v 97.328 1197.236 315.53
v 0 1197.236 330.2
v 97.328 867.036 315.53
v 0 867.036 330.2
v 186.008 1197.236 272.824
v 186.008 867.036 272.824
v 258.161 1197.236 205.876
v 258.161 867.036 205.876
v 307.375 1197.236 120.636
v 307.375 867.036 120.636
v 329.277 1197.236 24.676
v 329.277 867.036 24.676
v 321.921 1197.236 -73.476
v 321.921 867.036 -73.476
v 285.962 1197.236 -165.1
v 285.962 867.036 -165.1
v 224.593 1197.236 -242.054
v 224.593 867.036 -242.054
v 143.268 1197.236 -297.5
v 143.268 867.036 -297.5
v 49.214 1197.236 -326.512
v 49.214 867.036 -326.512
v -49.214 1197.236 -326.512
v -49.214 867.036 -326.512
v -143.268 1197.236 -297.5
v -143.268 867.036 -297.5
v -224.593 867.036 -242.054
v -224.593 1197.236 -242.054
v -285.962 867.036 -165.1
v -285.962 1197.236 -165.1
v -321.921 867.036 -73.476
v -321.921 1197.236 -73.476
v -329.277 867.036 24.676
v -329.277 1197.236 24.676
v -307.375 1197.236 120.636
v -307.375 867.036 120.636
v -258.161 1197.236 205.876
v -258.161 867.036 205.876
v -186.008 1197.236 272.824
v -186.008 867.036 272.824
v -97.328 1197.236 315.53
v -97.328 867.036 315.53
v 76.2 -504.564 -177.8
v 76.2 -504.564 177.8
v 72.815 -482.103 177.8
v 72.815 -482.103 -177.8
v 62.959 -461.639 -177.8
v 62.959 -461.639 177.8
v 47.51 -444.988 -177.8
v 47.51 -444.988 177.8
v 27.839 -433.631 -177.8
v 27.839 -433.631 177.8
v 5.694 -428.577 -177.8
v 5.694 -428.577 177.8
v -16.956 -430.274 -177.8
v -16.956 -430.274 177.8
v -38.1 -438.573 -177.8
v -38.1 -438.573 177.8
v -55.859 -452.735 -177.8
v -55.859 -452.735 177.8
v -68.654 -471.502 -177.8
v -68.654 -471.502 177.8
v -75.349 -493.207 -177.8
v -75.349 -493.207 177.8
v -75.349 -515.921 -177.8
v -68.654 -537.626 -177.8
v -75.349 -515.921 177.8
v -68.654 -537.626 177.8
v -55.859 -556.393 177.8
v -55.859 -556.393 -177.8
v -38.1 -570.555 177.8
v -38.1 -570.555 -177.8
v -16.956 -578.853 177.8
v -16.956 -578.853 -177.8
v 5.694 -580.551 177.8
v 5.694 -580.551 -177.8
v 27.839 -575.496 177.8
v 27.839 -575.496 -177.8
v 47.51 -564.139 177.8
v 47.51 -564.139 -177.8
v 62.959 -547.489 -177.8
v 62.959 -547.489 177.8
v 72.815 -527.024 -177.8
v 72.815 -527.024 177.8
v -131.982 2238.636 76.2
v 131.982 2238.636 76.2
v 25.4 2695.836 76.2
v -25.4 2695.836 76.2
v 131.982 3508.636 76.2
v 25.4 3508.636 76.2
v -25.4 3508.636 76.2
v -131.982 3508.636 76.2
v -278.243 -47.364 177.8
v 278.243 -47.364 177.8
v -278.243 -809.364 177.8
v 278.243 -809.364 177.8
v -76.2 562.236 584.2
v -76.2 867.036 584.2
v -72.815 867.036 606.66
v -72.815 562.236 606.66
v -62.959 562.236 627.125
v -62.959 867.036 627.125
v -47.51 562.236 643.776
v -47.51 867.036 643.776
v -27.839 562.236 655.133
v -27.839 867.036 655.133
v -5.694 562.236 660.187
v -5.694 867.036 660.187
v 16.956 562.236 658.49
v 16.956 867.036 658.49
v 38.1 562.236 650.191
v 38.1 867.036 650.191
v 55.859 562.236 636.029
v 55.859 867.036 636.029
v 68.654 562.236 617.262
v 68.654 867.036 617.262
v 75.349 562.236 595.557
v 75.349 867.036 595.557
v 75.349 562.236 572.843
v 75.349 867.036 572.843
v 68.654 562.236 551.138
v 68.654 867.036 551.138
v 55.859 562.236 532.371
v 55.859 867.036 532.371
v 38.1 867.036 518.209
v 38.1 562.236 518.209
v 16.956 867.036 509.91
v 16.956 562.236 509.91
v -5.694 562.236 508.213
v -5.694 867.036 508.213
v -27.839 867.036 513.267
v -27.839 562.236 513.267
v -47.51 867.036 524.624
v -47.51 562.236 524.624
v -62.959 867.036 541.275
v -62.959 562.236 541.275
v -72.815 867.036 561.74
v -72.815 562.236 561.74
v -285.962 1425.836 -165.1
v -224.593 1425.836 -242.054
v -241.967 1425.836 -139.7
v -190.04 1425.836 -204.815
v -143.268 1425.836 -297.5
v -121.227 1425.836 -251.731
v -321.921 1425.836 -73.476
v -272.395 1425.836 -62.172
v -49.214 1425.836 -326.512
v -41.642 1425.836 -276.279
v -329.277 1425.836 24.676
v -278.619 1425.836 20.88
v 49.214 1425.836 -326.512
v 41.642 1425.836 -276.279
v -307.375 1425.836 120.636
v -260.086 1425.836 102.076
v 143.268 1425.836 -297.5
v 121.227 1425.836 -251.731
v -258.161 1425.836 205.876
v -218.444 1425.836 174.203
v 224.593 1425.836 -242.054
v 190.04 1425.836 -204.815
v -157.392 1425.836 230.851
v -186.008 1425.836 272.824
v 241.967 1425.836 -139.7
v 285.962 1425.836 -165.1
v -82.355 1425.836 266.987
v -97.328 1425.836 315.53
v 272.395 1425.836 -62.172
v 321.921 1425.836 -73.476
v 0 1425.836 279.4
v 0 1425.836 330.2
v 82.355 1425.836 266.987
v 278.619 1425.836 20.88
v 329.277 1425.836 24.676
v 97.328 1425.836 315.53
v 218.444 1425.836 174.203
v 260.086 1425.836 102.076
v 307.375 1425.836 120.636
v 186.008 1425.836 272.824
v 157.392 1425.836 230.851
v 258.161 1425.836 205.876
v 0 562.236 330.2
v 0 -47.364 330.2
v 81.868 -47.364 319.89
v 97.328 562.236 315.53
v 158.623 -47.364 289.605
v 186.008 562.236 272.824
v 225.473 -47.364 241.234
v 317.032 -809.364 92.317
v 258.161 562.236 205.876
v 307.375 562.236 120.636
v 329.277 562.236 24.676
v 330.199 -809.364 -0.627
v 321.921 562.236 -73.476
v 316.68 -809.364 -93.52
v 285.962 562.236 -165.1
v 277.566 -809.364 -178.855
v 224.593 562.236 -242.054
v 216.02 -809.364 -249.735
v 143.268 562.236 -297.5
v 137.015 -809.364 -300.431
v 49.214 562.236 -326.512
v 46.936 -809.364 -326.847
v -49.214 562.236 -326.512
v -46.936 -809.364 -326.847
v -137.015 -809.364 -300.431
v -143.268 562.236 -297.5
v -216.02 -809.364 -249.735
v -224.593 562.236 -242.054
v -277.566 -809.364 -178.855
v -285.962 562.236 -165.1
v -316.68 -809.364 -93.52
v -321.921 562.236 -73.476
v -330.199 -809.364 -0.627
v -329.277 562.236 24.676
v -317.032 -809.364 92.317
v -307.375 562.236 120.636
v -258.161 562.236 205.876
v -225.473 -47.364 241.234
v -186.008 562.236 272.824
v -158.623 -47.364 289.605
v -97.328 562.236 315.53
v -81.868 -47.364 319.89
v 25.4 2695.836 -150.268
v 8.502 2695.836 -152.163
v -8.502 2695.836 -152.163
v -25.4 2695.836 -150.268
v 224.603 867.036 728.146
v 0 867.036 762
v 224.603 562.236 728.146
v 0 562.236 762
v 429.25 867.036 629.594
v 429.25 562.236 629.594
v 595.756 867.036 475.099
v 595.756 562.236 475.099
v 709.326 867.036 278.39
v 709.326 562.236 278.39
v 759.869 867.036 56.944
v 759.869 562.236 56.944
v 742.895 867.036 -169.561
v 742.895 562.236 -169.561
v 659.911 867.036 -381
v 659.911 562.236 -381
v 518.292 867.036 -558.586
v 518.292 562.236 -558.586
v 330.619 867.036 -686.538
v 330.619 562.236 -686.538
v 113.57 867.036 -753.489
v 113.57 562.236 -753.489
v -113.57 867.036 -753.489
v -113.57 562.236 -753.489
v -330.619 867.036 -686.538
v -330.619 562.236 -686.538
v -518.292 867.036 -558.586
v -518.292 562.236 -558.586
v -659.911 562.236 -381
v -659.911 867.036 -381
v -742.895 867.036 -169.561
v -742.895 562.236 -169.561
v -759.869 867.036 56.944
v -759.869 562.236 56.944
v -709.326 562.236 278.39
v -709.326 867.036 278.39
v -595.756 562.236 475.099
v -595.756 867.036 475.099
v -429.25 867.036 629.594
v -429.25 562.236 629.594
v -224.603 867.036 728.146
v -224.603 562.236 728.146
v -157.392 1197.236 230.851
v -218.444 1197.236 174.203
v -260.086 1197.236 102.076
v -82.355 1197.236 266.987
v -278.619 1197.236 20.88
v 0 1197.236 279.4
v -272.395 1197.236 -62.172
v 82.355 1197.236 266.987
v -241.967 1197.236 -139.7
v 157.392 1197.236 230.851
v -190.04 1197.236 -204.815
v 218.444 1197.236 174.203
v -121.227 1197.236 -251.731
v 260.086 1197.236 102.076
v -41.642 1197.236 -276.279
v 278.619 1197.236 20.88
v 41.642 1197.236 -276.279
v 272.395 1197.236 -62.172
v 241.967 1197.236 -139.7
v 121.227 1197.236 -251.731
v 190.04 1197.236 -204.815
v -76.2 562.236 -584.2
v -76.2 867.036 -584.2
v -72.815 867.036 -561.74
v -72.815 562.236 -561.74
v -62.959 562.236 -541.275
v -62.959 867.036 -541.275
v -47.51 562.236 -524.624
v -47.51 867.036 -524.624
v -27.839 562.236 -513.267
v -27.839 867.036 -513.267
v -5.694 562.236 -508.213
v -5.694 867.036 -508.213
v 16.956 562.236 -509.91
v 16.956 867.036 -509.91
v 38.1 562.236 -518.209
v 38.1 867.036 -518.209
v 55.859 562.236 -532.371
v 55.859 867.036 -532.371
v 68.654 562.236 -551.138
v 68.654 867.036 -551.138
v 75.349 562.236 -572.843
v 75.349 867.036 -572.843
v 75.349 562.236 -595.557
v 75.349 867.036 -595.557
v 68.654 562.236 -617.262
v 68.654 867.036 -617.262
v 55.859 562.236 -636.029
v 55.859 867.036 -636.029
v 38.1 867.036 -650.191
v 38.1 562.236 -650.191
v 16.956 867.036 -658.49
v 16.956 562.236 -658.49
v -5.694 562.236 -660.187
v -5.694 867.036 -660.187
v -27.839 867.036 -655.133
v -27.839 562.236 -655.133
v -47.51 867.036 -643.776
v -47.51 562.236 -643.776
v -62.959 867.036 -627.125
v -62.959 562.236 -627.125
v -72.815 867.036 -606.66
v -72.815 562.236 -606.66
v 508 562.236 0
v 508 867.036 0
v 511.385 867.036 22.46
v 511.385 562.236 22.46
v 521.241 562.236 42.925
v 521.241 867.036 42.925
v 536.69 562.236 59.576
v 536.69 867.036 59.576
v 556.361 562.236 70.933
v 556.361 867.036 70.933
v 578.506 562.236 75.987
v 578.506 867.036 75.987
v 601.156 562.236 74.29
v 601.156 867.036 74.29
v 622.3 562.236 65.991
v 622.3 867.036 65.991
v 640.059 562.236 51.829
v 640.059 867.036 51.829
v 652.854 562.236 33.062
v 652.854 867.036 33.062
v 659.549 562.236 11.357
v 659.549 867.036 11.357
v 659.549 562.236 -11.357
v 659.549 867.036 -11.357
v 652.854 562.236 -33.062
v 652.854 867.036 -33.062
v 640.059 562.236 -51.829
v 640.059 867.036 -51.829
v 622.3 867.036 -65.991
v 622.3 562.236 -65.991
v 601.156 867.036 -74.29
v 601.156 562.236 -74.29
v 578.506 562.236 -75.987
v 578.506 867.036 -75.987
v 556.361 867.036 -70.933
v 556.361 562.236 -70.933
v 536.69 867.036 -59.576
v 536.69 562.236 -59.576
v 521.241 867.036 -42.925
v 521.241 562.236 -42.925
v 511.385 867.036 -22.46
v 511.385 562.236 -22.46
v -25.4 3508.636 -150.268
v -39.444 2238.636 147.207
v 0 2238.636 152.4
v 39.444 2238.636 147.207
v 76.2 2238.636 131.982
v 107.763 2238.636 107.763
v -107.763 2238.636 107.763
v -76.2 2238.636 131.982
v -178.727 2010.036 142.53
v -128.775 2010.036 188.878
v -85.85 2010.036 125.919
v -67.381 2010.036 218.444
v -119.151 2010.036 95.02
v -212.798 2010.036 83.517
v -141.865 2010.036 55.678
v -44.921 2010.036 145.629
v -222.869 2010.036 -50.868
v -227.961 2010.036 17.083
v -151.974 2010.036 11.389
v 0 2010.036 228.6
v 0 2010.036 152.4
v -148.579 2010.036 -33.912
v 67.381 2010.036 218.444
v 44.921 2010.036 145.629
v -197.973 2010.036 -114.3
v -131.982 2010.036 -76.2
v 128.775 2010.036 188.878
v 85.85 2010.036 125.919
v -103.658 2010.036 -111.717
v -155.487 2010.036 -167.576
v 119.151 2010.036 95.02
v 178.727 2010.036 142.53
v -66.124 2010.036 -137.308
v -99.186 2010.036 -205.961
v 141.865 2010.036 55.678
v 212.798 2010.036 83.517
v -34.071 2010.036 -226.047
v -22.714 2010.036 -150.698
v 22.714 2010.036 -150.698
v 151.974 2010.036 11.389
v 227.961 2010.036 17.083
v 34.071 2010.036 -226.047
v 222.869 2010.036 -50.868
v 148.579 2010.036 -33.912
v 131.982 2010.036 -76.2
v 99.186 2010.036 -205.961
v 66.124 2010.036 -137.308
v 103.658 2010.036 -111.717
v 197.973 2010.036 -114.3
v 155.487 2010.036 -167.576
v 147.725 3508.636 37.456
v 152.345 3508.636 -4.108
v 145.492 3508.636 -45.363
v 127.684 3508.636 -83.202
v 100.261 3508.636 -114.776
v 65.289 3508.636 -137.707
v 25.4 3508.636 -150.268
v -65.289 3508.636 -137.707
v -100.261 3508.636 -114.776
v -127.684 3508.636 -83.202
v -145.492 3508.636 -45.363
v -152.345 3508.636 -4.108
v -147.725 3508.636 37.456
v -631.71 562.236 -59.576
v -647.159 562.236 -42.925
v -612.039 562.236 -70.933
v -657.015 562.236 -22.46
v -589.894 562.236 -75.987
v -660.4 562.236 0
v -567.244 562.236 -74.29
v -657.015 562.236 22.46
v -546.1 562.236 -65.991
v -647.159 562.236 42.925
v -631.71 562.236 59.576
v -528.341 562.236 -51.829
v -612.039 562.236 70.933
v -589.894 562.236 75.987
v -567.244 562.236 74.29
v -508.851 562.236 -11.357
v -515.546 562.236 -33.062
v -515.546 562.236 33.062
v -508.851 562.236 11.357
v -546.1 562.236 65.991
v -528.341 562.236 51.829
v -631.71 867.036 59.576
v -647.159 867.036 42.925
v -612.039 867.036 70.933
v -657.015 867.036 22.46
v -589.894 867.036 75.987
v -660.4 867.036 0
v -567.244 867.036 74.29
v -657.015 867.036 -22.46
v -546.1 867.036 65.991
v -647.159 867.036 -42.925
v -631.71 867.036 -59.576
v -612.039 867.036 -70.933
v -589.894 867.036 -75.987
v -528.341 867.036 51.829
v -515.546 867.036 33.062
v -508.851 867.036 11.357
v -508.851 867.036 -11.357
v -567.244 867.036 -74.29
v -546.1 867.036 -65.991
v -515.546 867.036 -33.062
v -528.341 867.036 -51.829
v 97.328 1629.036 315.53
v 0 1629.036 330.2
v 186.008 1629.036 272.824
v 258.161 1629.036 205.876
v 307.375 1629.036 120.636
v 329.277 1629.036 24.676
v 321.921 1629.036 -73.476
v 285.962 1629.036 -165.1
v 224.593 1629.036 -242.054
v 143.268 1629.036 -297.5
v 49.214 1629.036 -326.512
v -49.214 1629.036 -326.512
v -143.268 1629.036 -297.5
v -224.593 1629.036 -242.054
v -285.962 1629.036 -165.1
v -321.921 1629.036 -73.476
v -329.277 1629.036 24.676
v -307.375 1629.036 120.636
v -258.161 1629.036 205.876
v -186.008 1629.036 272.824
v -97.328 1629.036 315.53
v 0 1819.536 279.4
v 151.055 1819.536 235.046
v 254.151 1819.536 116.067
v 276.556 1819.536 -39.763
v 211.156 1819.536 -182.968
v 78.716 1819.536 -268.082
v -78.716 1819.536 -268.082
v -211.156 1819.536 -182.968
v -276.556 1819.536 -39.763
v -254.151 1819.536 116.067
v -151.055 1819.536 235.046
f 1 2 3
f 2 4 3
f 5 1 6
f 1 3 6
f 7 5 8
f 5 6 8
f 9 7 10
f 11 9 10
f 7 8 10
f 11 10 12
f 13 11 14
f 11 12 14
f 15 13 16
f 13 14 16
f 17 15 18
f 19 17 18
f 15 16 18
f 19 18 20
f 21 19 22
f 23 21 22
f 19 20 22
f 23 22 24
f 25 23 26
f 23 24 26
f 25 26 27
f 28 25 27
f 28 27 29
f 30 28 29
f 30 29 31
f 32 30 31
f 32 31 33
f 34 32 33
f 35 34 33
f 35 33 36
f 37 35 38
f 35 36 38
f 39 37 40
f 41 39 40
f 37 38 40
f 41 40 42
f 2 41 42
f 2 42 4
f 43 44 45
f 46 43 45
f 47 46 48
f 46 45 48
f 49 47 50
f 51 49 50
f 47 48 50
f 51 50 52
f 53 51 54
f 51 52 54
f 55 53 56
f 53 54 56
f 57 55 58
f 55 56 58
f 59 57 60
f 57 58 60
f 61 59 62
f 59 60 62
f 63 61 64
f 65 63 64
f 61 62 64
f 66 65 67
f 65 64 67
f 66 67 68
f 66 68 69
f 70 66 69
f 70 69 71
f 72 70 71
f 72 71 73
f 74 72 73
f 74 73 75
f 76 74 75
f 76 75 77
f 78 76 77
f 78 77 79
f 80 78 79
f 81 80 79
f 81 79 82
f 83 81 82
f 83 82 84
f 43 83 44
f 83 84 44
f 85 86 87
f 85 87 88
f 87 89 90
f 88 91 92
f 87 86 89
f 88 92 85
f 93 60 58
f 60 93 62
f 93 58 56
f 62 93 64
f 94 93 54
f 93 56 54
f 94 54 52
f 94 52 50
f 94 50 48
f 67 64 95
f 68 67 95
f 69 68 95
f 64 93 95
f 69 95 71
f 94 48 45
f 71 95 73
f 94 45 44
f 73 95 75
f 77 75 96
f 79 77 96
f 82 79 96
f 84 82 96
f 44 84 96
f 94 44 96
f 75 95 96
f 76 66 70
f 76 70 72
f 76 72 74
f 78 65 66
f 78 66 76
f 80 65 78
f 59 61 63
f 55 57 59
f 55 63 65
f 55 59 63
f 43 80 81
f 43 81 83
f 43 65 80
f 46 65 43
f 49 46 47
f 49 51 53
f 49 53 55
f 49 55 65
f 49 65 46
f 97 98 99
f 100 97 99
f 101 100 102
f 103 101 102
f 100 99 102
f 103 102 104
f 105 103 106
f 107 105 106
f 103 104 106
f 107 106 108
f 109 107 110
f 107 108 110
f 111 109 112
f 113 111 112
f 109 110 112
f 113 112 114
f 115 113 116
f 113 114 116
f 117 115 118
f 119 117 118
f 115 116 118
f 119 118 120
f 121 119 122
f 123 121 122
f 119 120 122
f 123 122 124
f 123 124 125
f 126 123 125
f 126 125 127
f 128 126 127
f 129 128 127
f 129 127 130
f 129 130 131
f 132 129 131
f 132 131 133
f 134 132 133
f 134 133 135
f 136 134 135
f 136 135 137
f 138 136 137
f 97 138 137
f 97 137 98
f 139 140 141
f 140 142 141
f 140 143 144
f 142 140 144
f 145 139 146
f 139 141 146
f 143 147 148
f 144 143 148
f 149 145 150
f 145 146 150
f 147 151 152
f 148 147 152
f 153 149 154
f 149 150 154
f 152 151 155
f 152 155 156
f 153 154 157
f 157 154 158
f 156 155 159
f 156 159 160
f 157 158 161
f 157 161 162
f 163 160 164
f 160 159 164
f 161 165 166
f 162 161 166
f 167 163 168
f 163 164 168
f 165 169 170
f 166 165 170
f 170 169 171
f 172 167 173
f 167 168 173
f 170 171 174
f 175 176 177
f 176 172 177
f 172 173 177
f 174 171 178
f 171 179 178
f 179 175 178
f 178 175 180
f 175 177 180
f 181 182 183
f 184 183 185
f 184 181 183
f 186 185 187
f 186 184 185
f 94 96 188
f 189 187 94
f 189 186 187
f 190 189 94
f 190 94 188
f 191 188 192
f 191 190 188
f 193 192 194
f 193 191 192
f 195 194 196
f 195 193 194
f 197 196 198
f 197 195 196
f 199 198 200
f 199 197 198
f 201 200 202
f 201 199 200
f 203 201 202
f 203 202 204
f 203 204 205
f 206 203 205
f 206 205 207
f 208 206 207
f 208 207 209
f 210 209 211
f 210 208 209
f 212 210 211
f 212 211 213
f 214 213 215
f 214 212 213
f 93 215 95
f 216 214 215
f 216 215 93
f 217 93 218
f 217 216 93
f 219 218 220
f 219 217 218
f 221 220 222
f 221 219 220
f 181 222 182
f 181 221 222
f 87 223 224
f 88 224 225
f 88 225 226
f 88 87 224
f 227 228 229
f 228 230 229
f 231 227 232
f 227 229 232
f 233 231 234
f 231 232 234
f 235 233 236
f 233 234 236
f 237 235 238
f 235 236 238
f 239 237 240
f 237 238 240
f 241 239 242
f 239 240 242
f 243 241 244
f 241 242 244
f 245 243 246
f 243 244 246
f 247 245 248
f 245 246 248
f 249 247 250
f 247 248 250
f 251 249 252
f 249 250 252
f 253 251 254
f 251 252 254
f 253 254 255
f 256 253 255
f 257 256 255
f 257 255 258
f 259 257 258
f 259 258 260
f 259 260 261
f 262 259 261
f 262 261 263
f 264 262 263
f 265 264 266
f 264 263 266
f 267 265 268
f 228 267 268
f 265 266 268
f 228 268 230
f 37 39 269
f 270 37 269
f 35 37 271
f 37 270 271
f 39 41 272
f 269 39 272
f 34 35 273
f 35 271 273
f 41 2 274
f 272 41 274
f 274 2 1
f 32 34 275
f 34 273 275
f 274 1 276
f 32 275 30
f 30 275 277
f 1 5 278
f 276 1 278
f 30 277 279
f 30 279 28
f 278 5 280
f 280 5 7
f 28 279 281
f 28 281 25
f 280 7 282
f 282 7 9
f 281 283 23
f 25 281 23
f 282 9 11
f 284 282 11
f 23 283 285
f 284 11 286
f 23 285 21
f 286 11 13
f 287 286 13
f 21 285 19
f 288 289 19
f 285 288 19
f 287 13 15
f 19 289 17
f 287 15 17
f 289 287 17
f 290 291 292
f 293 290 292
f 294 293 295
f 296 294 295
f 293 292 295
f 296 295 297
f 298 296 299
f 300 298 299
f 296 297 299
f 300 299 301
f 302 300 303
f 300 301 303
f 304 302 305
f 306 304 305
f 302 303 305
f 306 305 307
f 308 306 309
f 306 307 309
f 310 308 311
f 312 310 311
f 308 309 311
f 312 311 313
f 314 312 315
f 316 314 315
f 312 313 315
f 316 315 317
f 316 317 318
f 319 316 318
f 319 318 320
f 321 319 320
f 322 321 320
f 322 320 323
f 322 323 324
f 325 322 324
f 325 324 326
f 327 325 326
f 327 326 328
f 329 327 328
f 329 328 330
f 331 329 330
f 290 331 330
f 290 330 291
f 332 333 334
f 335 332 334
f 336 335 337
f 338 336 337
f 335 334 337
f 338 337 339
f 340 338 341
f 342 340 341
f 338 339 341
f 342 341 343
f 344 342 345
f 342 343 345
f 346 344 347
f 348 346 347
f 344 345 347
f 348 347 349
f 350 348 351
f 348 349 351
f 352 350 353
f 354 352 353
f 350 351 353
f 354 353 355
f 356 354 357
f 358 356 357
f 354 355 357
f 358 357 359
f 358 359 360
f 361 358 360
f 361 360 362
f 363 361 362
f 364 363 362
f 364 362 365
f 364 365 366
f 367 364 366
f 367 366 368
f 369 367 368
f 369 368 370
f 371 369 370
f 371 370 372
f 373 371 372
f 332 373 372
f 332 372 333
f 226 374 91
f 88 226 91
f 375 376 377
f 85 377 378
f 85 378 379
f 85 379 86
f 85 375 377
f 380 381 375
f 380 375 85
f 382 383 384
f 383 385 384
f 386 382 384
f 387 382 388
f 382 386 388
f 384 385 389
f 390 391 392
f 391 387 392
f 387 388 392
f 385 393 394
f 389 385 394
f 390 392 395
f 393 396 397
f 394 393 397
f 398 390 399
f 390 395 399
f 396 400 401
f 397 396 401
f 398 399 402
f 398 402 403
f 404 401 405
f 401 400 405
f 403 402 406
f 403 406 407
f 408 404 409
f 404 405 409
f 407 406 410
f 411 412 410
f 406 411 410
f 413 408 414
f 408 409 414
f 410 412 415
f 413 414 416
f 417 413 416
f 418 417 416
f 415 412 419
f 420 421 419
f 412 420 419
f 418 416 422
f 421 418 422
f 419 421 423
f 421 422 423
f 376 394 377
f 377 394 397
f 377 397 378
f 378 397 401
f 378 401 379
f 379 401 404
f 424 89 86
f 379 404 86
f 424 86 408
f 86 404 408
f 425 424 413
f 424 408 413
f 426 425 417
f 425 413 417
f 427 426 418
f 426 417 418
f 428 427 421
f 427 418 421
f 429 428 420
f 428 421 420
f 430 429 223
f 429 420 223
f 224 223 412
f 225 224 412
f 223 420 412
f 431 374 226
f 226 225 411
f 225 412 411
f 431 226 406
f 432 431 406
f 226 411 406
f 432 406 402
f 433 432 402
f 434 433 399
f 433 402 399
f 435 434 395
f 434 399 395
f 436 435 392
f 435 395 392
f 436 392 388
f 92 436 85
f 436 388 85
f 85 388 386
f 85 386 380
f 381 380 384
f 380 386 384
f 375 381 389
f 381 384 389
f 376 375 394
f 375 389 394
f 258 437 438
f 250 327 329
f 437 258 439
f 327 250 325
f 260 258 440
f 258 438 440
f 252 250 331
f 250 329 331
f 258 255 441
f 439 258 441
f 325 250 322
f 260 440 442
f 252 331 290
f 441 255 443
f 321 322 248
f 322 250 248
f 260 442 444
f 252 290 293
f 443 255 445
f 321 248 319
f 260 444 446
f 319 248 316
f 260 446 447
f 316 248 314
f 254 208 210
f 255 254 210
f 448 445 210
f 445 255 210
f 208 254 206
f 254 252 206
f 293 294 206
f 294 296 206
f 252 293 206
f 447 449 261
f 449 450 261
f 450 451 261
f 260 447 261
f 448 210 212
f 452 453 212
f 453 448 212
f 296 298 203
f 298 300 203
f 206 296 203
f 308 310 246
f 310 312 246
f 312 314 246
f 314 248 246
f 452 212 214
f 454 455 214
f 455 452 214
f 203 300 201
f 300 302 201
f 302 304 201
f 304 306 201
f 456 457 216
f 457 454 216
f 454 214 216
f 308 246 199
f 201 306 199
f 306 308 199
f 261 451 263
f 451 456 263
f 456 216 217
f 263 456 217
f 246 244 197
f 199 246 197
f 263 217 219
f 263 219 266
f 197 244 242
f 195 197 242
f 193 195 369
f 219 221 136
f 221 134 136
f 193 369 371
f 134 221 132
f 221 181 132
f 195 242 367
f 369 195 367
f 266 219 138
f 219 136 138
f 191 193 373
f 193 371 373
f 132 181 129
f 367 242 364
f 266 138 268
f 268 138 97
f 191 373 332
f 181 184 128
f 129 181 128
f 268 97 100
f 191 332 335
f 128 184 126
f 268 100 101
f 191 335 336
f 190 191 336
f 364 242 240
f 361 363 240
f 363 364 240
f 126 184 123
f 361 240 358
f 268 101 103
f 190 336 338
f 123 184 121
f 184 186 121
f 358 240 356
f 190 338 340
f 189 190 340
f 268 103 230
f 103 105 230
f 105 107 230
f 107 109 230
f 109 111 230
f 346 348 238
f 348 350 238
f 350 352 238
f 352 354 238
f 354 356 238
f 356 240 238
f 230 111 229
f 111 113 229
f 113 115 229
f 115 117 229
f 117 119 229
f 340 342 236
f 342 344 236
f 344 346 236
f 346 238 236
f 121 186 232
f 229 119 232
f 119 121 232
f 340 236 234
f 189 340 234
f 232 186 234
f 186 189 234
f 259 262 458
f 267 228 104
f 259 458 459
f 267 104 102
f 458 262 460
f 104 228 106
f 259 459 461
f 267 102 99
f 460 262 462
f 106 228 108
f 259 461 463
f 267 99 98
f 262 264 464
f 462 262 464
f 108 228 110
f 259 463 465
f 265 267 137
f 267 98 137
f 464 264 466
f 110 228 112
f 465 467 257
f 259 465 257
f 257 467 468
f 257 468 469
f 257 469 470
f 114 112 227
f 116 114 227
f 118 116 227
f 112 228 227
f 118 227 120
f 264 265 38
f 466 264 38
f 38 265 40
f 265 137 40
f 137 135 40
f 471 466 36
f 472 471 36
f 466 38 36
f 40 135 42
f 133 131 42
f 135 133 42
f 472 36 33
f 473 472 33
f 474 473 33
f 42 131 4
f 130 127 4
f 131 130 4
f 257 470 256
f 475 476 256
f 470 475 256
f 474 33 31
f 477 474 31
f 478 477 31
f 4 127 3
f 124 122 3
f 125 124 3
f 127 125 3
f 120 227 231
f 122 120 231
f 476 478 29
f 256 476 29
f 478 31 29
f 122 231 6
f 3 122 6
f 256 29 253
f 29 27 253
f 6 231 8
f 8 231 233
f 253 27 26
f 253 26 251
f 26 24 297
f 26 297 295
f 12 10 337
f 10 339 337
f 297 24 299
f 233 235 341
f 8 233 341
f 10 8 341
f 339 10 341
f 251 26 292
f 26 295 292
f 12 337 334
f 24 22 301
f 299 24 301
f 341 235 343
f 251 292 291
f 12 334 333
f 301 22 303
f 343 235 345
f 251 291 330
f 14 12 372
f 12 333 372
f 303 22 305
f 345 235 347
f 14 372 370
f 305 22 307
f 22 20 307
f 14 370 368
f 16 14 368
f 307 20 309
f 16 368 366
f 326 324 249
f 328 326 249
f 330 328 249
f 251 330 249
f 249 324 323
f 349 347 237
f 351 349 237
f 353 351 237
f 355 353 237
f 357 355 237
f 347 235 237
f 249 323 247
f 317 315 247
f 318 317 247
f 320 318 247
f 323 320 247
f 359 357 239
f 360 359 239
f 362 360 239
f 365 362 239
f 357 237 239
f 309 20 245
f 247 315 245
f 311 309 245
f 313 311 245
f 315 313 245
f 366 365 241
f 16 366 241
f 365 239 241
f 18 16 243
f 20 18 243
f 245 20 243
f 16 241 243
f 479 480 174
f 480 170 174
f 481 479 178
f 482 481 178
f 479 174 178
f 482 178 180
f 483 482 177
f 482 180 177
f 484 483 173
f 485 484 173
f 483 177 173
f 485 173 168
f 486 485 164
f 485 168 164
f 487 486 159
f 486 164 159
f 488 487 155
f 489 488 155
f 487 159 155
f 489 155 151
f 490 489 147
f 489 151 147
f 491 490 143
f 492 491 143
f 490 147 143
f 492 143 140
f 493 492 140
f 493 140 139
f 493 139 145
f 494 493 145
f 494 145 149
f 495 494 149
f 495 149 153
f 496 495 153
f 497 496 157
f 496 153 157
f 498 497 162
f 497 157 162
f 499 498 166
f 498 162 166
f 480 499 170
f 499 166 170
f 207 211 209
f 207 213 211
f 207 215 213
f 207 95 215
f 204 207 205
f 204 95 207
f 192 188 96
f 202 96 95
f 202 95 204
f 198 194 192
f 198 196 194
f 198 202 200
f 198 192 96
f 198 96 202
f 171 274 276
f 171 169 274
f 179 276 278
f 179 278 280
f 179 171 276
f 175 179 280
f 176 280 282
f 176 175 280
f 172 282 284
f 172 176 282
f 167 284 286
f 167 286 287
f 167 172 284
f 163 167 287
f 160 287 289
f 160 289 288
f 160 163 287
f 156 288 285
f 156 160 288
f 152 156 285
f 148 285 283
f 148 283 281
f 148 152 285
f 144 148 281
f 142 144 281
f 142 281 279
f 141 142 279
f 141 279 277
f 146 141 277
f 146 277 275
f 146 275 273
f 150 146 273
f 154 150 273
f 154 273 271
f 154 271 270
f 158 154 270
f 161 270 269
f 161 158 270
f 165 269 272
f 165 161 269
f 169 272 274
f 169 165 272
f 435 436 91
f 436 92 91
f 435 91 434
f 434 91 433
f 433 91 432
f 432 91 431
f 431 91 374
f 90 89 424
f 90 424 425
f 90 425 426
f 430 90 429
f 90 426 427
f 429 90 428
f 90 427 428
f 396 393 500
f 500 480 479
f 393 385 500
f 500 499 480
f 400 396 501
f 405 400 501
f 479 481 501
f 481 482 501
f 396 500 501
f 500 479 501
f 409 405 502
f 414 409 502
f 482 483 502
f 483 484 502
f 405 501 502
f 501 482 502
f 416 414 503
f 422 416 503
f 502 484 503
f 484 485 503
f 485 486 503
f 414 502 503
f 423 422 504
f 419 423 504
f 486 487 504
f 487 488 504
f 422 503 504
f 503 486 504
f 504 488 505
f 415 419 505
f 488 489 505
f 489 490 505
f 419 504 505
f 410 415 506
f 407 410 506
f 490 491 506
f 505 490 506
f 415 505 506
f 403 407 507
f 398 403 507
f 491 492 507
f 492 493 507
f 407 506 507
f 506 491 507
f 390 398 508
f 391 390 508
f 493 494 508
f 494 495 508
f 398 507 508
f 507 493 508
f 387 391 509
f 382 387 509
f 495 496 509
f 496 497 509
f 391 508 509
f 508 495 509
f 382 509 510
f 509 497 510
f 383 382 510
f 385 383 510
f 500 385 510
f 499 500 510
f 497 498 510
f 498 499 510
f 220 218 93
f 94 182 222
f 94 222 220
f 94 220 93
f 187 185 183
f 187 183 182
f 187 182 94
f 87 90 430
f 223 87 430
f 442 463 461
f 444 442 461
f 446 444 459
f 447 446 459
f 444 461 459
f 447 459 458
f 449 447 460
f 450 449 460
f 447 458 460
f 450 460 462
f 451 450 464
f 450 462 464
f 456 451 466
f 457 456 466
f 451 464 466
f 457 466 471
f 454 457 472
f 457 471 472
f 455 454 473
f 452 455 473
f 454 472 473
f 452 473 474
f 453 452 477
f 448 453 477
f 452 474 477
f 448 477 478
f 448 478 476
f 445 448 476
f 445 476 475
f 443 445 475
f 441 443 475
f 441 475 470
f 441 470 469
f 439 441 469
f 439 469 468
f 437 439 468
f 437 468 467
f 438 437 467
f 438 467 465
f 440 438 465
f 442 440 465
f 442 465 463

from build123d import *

# Parameters (mm, degrees)
F0_W      = 1371.6
F0_H      = 330.2
F0_W_2    = 228.6
F0_H_2    = 279.4
F0_W_3    = 812.8
F0_H_3    = 79.6570703387
F0_H_4    = 72.7429296613
F0_W_4    = 457.2
F2_R      = 76.2
F3_DEPTH  = 1676.401
F5_DEPTH  = 762
F6_R      = 76.2
F7_DEPTH  = 355.6
F9_DEPTH  = 1270
F11_DEPTH = 812.8


with BuildPart() as f1:
    # F0 (on Right) → F1 (revolve)
    with BuildSketch(Plane.YZ):
        with Locations((-123.5636745517, 165.1)):
            Rectangle(F0_W, F0_H)
        Polygon((562.2363254483, 330.2), (562.2363254483, 0), (867.0363254483, 0), (867.0363254483, 330.2), (867.0363254483, 762), (562.2363254483, 762), align=None)
        Polygon((867.0363254483, 330.2), (867.0363254483, 0), (1197.2363254483, 0), (1197.2363254483, 279.4), (1197.2363254483, 330.2), align=None)
        with Locations((1311.5363254483, 139.7)):
            Rectangle(F0_W_2, F0_H_2)
        Polygon((1425.8363254483, 279.4), (1425.8363254483, 0), (1629.0363254483, 0), (1629.0363254483, 330.2), (1425.8363254483, 330.2), align=None)
        Polygon((1629.0363254483, 330.2), (1629.0363254483, 0), (2010.0363254483, 0), (2010.0363254483, 152.4), (2010.0363254483, 228.6), align=None)
        Polygon((2010.0363254483, 152.4), (2010.0363254483, 0), (2695.8363254483, 0), (2695.8363254483, 79.6570703387), (2238.6363254483, 79.6570703387), (2238.6363254483, 152.4), align=None)
        with Locations((3102.2363254483, 39.8285351694)):
            Rectangle(F0_W_3, F0_H_3)
        with Locations((3102.2363254483, 116.0285351694)):
            Rectangle(F0_W_3, F0_H_4)
        with Locations((2467.2363254483, 116.0285351694)):
            Rectangle(F0_W_4, F0_H_4)
    revolve(axis=Axis((0, 1349.6363254483, 0), (0, 1, 0)))

    # F2 (on face) → F3 (cut, through all)
    with BuildSketch(Plane(origin=(0, 867.0363254483, 0), x_dir=(-1, 0, 0), z_dir=(0, 1, 0))):
        with Locations((-584.2, 0)):
            Circle(F2_R)
        with Locations((0, 584.2)):
            Circle(F2_R)
        with Locations((0, -584.2)):
            Circle(F2_R)
        with Locations((584.2, 0)):
            Circle(F2_R)
    extrude(amount=-F3_DEPTH, mode=Mode.SUBTRACT)

    # F4 (on face) → F5 (cut)
    with BuildSketch(Plane.XZ.offset(809.3636745517)):
        with BuildLine():
            ThreePointArc((278.2430592126, 177.8), (0, 330.2), (-278.2430592126, 177.8))
            Line((-278.2430592126, 177.8), (278.2430592126, 177.8))
        make_face()
    extrude(amount=-F5_DEPTH, mode=Mode.SUBTRACT)

    # F6 (on face) → F7 (cut)
    with BuildSketch(Plane.XY.offset(177.8)):
        with Locations((0, -504.5636745517)):
            Circle(F6_R)
    extrude(amount=-F7_DEPTH, mode=Mode.SUBTRACT)

    # F8 (on face) → F9 (cut)
    with BuildSketch(Plane(origin=(0, 3508.6363254483, 0), x_dir=(-1, 0, 0), z_dir=(0, 1, 0))):
        with BuildLine():
            ThreePointArc((131.9822715367, 76.2), (0, 152.4), (-131.9822715367, 76.2))
            Line((-131.9822715367, 76.2), (131.9822715367, 76.2))
        make_face()
    extrude(amount=-F9_DEPTH, mode=Mode.SUBTRACT)

    # F10 (on face) → F11 (cut)
    with BuildSketch(Plane(origin=(0, 3508.6363254483, 0), x_dir=(-1, 0, 0), z_dir=(0, 1, 0))):
        with BuildLine():
            Line((25.4, 76.2), (-25.4, 76.2))
            Line((-25.4, 76.2), (-25.4, -150.2684264907))
            ThreePointArc((-25.4, -150.2684264907), (0, -152.4), (25.4, -150.2684264907))
            Line((25.4, -150.2684264907), (25.4, 76.2))
        make_face()
    extrude(amount=-F11_DEPTH, mode=Mode.SUBTRACT)


solid = f1.part
